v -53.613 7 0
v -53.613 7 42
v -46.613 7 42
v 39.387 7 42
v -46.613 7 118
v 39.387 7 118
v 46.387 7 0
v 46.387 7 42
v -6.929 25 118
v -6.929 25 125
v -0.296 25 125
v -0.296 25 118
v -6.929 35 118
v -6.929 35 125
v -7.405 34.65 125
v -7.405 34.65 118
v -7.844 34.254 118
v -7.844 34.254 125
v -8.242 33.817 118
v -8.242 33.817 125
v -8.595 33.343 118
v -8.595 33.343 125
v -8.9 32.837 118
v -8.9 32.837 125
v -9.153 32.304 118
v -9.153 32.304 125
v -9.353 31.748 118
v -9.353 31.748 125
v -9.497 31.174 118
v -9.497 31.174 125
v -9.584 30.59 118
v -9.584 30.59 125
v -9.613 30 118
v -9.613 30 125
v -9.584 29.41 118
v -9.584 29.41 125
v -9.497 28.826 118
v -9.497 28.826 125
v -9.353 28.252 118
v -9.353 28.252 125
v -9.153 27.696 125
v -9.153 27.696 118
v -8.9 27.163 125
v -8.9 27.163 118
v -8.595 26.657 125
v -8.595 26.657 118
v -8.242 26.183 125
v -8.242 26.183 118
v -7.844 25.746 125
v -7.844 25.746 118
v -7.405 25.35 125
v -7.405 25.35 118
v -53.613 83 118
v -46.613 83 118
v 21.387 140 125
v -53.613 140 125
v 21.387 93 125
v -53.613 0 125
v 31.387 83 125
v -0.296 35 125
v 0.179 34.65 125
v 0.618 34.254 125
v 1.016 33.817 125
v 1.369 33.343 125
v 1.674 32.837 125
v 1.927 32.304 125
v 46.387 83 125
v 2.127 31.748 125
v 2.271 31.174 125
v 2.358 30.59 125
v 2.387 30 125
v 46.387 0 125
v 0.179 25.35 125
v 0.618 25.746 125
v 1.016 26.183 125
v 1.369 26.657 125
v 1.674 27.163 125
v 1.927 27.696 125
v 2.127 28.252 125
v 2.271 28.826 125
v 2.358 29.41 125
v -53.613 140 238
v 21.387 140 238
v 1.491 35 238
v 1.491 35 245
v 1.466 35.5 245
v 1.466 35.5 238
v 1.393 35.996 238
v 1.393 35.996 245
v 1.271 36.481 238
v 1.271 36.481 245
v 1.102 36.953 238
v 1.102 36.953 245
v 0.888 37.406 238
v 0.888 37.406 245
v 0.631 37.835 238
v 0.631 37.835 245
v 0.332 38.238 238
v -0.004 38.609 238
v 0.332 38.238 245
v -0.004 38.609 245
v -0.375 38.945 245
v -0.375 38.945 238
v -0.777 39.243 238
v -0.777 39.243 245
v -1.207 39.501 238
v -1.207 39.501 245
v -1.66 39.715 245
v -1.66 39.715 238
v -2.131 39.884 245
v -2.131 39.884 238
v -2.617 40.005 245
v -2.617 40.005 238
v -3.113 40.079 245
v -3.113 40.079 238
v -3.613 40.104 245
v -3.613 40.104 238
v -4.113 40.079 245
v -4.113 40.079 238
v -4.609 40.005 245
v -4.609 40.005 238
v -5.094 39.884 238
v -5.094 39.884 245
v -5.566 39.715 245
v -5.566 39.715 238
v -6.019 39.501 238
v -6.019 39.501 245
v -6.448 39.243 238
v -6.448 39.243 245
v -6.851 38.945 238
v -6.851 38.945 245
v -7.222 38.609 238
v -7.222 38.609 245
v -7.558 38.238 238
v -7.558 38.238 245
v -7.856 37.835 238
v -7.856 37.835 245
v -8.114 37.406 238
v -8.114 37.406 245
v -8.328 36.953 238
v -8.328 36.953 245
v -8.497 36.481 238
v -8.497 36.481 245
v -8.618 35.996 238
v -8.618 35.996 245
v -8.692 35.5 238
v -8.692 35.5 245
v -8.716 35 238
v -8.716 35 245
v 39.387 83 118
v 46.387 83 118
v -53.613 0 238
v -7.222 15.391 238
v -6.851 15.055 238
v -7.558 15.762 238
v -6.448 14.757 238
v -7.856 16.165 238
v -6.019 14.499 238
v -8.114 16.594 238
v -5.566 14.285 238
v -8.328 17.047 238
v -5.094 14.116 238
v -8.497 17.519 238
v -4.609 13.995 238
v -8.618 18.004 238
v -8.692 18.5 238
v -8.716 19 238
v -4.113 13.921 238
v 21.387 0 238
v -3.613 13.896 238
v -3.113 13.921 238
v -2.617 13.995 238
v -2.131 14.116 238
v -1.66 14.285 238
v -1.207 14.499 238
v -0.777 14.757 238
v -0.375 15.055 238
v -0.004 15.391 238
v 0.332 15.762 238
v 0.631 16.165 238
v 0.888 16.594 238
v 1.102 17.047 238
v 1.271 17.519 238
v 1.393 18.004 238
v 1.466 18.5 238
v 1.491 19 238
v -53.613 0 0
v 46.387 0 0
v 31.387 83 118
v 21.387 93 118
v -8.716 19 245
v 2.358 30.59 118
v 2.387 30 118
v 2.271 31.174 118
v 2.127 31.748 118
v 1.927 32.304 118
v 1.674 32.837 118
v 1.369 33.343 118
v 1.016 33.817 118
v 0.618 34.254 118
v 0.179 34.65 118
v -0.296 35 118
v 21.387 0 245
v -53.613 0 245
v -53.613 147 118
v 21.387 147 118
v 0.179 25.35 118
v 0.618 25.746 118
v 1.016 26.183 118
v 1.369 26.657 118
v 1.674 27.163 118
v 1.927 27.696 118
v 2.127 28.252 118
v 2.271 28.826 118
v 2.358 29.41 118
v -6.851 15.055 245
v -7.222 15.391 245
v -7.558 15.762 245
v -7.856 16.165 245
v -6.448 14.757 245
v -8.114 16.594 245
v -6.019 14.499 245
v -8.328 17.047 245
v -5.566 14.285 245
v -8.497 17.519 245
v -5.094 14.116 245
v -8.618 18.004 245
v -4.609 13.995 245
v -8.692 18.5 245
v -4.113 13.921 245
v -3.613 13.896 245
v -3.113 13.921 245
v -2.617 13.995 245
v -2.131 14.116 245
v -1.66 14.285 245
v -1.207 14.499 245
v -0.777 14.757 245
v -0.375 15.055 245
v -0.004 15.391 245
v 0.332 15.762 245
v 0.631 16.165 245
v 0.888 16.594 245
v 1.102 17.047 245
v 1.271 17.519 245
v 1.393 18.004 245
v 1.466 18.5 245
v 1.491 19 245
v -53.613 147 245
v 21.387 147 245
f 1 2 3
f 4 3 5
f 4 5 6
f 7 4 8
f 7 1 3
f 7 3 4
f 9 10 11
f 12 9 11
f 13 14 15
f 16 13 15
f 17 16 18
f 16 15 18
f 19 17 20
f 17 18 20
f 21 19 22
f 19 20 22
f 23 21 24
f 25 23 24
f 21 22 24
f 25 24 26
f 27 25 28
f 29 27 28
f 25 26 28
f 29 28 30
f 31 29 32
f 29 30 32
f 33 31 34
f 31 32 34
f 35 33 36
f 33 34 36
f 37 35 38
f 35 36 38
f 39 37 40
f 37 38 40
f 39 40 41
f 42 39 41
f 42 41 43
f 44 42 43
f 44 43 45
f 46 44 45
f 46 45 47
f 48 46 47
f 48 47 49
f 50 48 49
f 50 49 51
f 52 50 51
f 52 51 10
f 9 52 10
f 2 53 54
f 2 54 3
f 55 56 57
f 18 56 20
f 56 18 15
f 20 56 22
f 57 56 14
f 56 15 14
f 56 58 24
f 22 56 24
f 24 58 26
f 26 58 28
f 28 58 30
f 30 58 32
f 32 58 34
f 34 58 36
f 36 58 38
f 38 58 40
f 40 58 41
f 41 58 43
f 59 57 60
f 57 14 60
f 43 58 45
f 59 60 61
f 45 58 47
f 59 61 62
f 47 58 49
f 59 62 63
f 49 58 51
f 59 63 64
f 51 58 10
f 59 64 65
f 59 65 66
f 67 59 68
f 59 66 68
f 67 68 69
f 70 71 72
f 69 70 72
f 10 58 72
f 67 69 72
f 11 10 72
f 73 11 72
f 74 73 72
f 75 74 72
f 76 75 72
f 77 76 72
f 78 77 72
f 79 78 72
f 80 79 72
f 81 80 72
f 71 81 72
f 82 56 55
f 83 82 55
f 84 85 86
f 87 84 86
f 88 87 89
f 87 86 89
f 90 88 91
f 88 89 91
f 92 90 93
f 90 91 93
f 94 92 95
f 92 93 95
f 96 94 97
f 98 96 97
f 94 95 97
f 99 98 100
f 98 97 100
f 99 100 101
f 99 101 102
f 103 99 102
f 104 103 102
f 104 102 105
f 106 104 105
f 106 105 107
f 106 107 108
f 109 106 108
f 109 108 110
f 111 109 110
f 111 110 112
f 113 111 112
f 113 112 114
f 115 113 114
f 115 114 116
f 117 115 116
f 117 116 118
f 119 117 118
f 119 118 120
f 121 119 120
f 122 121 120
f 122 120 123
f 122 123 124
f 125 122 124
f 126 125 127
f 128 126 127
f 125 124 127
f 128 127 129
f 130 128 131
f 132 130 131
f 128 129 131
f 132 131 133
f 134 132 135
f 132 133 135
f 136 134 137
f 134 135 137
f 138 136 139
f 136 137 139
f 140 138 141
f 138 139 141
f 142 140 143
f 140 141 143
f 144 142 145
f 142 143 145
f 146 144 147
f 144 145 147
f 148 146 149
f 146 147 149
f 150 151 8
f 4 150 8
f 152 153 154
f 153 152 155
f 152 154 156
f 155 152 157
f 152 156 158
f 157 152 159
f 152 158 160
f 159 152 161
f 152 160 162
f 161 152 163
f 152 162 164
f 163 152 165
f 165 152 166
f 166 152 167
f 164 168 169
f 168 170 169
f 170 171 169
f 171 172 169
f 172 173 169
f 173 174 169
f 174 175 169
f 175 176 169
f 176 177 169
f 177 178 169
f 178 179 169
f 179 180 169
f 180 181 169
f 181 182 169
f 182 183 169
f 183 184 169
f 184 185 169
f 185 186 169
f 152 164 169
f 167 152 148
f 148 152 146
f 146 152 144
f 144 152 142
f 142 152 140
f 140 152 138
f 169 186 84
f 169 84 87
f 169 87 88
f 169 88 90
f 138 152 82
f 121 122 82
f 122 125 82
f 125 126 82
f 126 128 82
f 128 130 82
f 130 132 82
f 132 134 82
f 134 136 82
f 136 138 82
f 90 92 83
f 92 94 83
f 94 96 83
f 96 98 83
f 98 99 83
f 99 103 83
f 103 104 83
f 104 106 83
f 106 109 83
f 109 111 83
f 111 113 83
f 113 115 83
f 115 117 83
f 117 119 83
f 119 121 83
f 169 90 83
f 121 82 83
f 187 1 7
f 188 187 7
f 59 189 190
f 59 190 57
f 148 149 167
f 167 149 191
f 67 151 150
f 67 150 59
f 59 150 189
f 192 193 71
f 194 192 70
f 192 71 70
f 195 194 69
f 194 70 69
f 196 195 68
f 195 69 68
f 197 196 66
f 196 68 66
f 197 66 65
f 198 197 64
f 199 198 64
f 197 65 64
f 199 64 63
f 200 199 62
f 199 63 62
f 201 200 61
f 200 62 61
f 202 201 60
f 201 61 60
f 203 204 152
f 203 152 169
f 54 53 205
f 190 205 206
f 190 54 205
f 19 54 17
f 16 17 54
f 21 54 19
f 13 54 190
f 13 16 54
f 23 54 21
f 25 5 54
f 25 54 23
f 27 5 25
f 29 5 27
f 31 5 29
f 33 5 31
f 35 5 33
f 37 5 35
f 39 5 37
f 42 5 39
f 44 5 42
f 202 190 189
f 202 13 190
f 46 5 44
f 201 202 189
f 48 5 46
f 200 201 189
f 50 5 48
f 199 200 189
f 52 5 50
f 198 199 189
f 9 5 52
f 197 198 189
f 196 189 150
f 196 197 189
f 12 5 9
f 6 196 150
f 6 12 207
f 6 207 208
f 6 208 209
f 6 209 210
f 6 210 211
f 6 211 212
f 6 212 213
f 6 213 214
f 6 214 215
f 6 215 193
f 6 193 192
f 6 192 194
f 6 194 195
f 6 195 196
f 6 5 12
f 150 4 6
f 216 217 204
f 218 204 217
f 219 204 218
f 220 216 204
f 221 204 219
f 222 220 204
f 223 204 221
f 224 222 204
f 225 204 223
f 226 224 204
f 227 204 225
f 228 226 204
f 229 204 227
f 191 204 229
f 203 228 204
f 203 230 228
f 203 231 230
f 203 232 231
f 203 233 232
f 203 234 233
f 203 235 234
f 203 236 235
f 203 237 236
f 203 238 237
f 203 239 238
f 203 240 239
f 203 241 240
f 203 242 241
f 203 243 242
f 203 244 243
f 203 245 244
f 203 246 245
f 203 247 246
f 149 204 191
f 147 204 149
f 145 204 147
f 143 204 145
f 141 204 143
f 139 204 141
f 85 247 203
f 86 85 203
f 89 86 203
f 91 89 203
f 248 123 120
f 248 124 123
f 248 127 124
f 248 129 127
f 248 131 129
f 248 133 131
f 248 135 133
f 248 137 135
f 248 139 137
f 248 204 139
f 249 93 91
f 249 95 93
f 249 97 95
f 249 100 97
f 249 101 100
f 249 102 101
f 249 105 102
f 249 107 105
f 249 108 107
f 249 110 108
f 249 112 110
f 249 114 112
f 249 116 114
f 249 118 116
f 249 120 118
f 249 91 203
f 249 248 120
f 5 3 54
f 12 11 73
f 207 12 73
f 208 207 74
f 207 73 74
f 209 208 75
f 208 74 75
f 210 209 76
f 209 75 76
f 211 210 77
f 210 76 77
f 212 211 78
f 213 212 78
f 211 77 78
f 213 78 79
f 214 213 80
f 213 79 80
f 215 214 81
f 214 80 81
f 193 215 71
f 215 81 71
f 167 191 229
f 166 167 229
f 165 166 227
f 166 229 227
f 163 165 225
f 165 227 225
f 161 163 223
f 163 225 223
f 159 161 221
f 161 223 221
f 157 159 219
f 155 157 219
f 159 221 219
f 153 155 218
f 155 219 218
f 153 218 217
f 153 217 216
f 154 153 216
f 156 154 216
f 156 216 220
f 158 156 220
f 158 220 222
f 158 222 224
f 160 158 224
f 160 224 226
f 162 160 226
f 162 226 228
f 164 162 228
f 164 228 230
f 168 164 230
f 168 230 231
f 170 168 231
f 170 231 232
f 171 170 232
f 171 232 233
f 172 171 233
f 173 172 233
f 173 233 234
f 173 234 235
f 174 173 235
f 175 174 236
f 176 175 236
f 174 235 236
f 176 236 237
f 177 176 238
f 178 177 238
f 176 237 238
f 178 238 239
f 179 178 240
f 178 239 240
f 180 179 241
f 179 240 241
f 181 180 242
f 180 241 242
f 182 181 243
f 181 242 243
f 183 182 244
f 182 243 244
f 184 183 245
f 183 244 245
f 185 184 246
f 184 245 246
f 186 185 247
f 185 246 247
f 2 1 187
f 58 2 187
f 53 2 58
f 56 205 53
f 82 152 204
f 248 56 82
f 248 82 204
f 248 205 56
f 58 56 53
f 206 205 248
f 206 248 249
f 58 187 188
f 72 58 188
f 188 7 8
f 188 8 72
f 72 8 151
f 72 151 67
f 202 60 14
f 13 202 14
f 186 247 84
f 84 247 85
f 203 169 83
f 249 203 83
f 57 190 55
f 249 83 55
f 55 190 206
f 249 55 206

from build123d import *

# Parameters (mm, degrees)
SKETCH3_W           = 100
SKETCH3_H           = 7
BOSS_EXTRUDE3_DEPTH = 125
SKETCH4_W           = 100
SKETCH4_H           = 7
BOSS_EXTRUDE4_DEPTH = 140
CUT_EXTRUDE2_REACH  = 202.271
BOSS_EXTRUDE5_DEPTH = 7
BOSS_EXTRUDE6_DEPTH = 7
SKETCH8_W           = 100
SKETCH8_H           = 7
BOSS_EXTRUDE7_DEPTH = 120
SKETCH9_W           = 100
SKETCH9_H           = 7
BOSS_EXTRUDE8_DEPTH = 140
CUT_EXTRUDE3_REACH  = 292.703
SKETCH13_W          = 25
SKETCH13_H          = 64
CUT_EXTRUDE4_DEPTH  = 202.525034925
CHAMFER1_SIZE       = 10
CUT_EXTRUDE5_REACH  = 292.703
SKETCH15_W          = 25
SKETCH15_H          = 83


with BuildPart() as part:
    # Sketch3 → Boss-Extrude3 (new body)
    with BuildSketch(Plane.XY):
        with Locations((-3.612868806, 3.5)):
            Rectangle(SKETCH3_W, SKETCH3_H)
    extrude(amount=BOSS_EXTRUDE3_DEPTH)

    # Sketch4 → Boss-Extrude4 (add)
    with BuildSketch(Plane(origin=(0, 7, 0), x_dir=(1, 0, 0), z_dir=(0, 1, 0))):
        with Locations((-3.612868806, -121.5)):
            Rectangle(SKETCH4_W, SKETCH4_H)
    extrude(amount=BOSS_EXTRUDE4_DEPTH)

    # Sketch5 → Cut-Extrude2 (cut, up to next)
    with BuildSketch(Plane.XY.offset(125), mode=Mode.PRIVATE) as cut_extrude2_sk1:
        with BuildLine():
            ThreePointArc((2.387131194, 30), (1.673895268, 32.837274331), (-0.296244016, 35))
            Line((-0.296244016, 35), (-6.929493596, 35))
            ThreePointArc((-6.929493596, 35), (-9.612868806, 30), (-6.929493596, 25))
            Line((-6.929493596, 25), (-0.296244016, 25))
            ThreePointArc((-0.296244016, 25), (1.673895268, 27.162725669), (2.387131194, 30))
        make_face()
    cut_extrude2_tool1 = extrude(cut_extrude2_sk1.sketch, amount=-CUT_EXTRUDE2_REACH, mode=Mode.PRIVATE) & part.part
    add(cut_extrude2_tool1.solids().sort_by_distance((-3.612869, 30, 125))[0], mode=Mode.SUBTRACT)

    # Sketch6 → Boss-Extrude5 (add)
    with BuildSketch(Plane.ZY.offset(53.612868806)):
        Polygon((125, 0), (125, 90), (35, 0), align=None)
    extrude(amount=-BOSS_EXTRUDE5_DEPTH)

    # Sketch7 → Boss-Extrude6 (add)
    with BuildSketch(Plane(origin=(46.387131194, 0, 0), x_dir=(0, 0, -1), z_dir=(1, 0, 0))):
        Polygon((-125, 0), (-125, 90), (-35, 0), align=None)
    extrude(amount=-BOSS_EXTRUDE6_DEPTH)

    # Sketch8 → Boss-Extrude7 (add)
    with BuildSketch(Plane.XY.offset(125)):
        with Locations((-3.612868806, 143.5)):
            Rectangle(SKETCH8_W, SKETCH8_H)
    extrude(amount=BOSS_EXTRUDE7_DEPTH)

    # Sketch9 → Boss-Extrude8 (add)
    with BuildSketch(Plane.XZ.offset(-140)):
        with Locations((-3.612868806, 241.5)):
            Rectangle(SKETCH9_W, SKETCH9_H)
    extrude(amount=BOSS_EXTRUDE8_DEPTH)

    # Sketch10 → Cut-Extrude3 (cut, up to next)
    with BuildSketch(Plane.XY.offset(245), mode=Mode.PRIVATE) as cut_extrude3_sk1:
        with BuildLine():
            Line((-8.716428721, 35), (-8.716428721, 19))
            ThreePointArc((-8.716428721, 19), (-3.612868806, 13.896440085), (1.490691109, 19))
            Line((1.490691109, 19), (1.490691109, 35))
            ThreePointArc((1.490691109, 35), (-3.612868806, 40.103559915), (-8.716428721, 35))
        make_face()
    cut_extrude3_tool1 = extrude(cut_extrude3_sk1.sketch, amount=-CUT_EXTRUDE3_REACH, mode=Mode.PRIVATE) & part.part
    add(cut_extrude3_tool1.solids().sort_by_distance((-3.612869, 27, 245))[0], mode=Mode.SUBTRACT)

    # Sketch13 → Cut-Extrude4 (cut, through all)
    with BuildSketch(Plane(origin=(0, 0, 118), x_dir=(-1, 0, 0), z_dir=(0, 0, -1))):
        with Locations((-33.887131194, 115)):
            Rectangle(SKETCH13_W, SKETCH13_H)
    extrude(amount=-CUT_EXTRUDE4_DEPTH, mode=Mode.SUBTRACT)

    # Chamfer1
    chamfer1_edges = [part.edges().sort_by_distance(p)[0] for p in [
        (21.387131194, 83, 121.5),
    ]]
    chamfer(chamfer1_edges, length=CHAMFER1_SIZE)

    # Sketch15 → Cut-Extrude5 (cut, up to next)
    with BuildSketch(Plane.XY.offset(245), mode=Mode.PRIVATE) as cut_extrude5_sk1:
        with Locations((33.887131194, 41.5)):
            Rectangle(SKETCH15_W, SKETCH15_H)
    cut_extrude5_tool1 = extrude(cut_extrude5_sk1.sketch, amount=-CUT_EXTRUDE5_REACH, mode=Mode.PRIVATE) & part.part
    add(cut_extrude5_tool1.solids().sort_by_distance((33.887131, 41.5, 245))[0], mode=Mode.SUBTRACT)


solid = part.part
